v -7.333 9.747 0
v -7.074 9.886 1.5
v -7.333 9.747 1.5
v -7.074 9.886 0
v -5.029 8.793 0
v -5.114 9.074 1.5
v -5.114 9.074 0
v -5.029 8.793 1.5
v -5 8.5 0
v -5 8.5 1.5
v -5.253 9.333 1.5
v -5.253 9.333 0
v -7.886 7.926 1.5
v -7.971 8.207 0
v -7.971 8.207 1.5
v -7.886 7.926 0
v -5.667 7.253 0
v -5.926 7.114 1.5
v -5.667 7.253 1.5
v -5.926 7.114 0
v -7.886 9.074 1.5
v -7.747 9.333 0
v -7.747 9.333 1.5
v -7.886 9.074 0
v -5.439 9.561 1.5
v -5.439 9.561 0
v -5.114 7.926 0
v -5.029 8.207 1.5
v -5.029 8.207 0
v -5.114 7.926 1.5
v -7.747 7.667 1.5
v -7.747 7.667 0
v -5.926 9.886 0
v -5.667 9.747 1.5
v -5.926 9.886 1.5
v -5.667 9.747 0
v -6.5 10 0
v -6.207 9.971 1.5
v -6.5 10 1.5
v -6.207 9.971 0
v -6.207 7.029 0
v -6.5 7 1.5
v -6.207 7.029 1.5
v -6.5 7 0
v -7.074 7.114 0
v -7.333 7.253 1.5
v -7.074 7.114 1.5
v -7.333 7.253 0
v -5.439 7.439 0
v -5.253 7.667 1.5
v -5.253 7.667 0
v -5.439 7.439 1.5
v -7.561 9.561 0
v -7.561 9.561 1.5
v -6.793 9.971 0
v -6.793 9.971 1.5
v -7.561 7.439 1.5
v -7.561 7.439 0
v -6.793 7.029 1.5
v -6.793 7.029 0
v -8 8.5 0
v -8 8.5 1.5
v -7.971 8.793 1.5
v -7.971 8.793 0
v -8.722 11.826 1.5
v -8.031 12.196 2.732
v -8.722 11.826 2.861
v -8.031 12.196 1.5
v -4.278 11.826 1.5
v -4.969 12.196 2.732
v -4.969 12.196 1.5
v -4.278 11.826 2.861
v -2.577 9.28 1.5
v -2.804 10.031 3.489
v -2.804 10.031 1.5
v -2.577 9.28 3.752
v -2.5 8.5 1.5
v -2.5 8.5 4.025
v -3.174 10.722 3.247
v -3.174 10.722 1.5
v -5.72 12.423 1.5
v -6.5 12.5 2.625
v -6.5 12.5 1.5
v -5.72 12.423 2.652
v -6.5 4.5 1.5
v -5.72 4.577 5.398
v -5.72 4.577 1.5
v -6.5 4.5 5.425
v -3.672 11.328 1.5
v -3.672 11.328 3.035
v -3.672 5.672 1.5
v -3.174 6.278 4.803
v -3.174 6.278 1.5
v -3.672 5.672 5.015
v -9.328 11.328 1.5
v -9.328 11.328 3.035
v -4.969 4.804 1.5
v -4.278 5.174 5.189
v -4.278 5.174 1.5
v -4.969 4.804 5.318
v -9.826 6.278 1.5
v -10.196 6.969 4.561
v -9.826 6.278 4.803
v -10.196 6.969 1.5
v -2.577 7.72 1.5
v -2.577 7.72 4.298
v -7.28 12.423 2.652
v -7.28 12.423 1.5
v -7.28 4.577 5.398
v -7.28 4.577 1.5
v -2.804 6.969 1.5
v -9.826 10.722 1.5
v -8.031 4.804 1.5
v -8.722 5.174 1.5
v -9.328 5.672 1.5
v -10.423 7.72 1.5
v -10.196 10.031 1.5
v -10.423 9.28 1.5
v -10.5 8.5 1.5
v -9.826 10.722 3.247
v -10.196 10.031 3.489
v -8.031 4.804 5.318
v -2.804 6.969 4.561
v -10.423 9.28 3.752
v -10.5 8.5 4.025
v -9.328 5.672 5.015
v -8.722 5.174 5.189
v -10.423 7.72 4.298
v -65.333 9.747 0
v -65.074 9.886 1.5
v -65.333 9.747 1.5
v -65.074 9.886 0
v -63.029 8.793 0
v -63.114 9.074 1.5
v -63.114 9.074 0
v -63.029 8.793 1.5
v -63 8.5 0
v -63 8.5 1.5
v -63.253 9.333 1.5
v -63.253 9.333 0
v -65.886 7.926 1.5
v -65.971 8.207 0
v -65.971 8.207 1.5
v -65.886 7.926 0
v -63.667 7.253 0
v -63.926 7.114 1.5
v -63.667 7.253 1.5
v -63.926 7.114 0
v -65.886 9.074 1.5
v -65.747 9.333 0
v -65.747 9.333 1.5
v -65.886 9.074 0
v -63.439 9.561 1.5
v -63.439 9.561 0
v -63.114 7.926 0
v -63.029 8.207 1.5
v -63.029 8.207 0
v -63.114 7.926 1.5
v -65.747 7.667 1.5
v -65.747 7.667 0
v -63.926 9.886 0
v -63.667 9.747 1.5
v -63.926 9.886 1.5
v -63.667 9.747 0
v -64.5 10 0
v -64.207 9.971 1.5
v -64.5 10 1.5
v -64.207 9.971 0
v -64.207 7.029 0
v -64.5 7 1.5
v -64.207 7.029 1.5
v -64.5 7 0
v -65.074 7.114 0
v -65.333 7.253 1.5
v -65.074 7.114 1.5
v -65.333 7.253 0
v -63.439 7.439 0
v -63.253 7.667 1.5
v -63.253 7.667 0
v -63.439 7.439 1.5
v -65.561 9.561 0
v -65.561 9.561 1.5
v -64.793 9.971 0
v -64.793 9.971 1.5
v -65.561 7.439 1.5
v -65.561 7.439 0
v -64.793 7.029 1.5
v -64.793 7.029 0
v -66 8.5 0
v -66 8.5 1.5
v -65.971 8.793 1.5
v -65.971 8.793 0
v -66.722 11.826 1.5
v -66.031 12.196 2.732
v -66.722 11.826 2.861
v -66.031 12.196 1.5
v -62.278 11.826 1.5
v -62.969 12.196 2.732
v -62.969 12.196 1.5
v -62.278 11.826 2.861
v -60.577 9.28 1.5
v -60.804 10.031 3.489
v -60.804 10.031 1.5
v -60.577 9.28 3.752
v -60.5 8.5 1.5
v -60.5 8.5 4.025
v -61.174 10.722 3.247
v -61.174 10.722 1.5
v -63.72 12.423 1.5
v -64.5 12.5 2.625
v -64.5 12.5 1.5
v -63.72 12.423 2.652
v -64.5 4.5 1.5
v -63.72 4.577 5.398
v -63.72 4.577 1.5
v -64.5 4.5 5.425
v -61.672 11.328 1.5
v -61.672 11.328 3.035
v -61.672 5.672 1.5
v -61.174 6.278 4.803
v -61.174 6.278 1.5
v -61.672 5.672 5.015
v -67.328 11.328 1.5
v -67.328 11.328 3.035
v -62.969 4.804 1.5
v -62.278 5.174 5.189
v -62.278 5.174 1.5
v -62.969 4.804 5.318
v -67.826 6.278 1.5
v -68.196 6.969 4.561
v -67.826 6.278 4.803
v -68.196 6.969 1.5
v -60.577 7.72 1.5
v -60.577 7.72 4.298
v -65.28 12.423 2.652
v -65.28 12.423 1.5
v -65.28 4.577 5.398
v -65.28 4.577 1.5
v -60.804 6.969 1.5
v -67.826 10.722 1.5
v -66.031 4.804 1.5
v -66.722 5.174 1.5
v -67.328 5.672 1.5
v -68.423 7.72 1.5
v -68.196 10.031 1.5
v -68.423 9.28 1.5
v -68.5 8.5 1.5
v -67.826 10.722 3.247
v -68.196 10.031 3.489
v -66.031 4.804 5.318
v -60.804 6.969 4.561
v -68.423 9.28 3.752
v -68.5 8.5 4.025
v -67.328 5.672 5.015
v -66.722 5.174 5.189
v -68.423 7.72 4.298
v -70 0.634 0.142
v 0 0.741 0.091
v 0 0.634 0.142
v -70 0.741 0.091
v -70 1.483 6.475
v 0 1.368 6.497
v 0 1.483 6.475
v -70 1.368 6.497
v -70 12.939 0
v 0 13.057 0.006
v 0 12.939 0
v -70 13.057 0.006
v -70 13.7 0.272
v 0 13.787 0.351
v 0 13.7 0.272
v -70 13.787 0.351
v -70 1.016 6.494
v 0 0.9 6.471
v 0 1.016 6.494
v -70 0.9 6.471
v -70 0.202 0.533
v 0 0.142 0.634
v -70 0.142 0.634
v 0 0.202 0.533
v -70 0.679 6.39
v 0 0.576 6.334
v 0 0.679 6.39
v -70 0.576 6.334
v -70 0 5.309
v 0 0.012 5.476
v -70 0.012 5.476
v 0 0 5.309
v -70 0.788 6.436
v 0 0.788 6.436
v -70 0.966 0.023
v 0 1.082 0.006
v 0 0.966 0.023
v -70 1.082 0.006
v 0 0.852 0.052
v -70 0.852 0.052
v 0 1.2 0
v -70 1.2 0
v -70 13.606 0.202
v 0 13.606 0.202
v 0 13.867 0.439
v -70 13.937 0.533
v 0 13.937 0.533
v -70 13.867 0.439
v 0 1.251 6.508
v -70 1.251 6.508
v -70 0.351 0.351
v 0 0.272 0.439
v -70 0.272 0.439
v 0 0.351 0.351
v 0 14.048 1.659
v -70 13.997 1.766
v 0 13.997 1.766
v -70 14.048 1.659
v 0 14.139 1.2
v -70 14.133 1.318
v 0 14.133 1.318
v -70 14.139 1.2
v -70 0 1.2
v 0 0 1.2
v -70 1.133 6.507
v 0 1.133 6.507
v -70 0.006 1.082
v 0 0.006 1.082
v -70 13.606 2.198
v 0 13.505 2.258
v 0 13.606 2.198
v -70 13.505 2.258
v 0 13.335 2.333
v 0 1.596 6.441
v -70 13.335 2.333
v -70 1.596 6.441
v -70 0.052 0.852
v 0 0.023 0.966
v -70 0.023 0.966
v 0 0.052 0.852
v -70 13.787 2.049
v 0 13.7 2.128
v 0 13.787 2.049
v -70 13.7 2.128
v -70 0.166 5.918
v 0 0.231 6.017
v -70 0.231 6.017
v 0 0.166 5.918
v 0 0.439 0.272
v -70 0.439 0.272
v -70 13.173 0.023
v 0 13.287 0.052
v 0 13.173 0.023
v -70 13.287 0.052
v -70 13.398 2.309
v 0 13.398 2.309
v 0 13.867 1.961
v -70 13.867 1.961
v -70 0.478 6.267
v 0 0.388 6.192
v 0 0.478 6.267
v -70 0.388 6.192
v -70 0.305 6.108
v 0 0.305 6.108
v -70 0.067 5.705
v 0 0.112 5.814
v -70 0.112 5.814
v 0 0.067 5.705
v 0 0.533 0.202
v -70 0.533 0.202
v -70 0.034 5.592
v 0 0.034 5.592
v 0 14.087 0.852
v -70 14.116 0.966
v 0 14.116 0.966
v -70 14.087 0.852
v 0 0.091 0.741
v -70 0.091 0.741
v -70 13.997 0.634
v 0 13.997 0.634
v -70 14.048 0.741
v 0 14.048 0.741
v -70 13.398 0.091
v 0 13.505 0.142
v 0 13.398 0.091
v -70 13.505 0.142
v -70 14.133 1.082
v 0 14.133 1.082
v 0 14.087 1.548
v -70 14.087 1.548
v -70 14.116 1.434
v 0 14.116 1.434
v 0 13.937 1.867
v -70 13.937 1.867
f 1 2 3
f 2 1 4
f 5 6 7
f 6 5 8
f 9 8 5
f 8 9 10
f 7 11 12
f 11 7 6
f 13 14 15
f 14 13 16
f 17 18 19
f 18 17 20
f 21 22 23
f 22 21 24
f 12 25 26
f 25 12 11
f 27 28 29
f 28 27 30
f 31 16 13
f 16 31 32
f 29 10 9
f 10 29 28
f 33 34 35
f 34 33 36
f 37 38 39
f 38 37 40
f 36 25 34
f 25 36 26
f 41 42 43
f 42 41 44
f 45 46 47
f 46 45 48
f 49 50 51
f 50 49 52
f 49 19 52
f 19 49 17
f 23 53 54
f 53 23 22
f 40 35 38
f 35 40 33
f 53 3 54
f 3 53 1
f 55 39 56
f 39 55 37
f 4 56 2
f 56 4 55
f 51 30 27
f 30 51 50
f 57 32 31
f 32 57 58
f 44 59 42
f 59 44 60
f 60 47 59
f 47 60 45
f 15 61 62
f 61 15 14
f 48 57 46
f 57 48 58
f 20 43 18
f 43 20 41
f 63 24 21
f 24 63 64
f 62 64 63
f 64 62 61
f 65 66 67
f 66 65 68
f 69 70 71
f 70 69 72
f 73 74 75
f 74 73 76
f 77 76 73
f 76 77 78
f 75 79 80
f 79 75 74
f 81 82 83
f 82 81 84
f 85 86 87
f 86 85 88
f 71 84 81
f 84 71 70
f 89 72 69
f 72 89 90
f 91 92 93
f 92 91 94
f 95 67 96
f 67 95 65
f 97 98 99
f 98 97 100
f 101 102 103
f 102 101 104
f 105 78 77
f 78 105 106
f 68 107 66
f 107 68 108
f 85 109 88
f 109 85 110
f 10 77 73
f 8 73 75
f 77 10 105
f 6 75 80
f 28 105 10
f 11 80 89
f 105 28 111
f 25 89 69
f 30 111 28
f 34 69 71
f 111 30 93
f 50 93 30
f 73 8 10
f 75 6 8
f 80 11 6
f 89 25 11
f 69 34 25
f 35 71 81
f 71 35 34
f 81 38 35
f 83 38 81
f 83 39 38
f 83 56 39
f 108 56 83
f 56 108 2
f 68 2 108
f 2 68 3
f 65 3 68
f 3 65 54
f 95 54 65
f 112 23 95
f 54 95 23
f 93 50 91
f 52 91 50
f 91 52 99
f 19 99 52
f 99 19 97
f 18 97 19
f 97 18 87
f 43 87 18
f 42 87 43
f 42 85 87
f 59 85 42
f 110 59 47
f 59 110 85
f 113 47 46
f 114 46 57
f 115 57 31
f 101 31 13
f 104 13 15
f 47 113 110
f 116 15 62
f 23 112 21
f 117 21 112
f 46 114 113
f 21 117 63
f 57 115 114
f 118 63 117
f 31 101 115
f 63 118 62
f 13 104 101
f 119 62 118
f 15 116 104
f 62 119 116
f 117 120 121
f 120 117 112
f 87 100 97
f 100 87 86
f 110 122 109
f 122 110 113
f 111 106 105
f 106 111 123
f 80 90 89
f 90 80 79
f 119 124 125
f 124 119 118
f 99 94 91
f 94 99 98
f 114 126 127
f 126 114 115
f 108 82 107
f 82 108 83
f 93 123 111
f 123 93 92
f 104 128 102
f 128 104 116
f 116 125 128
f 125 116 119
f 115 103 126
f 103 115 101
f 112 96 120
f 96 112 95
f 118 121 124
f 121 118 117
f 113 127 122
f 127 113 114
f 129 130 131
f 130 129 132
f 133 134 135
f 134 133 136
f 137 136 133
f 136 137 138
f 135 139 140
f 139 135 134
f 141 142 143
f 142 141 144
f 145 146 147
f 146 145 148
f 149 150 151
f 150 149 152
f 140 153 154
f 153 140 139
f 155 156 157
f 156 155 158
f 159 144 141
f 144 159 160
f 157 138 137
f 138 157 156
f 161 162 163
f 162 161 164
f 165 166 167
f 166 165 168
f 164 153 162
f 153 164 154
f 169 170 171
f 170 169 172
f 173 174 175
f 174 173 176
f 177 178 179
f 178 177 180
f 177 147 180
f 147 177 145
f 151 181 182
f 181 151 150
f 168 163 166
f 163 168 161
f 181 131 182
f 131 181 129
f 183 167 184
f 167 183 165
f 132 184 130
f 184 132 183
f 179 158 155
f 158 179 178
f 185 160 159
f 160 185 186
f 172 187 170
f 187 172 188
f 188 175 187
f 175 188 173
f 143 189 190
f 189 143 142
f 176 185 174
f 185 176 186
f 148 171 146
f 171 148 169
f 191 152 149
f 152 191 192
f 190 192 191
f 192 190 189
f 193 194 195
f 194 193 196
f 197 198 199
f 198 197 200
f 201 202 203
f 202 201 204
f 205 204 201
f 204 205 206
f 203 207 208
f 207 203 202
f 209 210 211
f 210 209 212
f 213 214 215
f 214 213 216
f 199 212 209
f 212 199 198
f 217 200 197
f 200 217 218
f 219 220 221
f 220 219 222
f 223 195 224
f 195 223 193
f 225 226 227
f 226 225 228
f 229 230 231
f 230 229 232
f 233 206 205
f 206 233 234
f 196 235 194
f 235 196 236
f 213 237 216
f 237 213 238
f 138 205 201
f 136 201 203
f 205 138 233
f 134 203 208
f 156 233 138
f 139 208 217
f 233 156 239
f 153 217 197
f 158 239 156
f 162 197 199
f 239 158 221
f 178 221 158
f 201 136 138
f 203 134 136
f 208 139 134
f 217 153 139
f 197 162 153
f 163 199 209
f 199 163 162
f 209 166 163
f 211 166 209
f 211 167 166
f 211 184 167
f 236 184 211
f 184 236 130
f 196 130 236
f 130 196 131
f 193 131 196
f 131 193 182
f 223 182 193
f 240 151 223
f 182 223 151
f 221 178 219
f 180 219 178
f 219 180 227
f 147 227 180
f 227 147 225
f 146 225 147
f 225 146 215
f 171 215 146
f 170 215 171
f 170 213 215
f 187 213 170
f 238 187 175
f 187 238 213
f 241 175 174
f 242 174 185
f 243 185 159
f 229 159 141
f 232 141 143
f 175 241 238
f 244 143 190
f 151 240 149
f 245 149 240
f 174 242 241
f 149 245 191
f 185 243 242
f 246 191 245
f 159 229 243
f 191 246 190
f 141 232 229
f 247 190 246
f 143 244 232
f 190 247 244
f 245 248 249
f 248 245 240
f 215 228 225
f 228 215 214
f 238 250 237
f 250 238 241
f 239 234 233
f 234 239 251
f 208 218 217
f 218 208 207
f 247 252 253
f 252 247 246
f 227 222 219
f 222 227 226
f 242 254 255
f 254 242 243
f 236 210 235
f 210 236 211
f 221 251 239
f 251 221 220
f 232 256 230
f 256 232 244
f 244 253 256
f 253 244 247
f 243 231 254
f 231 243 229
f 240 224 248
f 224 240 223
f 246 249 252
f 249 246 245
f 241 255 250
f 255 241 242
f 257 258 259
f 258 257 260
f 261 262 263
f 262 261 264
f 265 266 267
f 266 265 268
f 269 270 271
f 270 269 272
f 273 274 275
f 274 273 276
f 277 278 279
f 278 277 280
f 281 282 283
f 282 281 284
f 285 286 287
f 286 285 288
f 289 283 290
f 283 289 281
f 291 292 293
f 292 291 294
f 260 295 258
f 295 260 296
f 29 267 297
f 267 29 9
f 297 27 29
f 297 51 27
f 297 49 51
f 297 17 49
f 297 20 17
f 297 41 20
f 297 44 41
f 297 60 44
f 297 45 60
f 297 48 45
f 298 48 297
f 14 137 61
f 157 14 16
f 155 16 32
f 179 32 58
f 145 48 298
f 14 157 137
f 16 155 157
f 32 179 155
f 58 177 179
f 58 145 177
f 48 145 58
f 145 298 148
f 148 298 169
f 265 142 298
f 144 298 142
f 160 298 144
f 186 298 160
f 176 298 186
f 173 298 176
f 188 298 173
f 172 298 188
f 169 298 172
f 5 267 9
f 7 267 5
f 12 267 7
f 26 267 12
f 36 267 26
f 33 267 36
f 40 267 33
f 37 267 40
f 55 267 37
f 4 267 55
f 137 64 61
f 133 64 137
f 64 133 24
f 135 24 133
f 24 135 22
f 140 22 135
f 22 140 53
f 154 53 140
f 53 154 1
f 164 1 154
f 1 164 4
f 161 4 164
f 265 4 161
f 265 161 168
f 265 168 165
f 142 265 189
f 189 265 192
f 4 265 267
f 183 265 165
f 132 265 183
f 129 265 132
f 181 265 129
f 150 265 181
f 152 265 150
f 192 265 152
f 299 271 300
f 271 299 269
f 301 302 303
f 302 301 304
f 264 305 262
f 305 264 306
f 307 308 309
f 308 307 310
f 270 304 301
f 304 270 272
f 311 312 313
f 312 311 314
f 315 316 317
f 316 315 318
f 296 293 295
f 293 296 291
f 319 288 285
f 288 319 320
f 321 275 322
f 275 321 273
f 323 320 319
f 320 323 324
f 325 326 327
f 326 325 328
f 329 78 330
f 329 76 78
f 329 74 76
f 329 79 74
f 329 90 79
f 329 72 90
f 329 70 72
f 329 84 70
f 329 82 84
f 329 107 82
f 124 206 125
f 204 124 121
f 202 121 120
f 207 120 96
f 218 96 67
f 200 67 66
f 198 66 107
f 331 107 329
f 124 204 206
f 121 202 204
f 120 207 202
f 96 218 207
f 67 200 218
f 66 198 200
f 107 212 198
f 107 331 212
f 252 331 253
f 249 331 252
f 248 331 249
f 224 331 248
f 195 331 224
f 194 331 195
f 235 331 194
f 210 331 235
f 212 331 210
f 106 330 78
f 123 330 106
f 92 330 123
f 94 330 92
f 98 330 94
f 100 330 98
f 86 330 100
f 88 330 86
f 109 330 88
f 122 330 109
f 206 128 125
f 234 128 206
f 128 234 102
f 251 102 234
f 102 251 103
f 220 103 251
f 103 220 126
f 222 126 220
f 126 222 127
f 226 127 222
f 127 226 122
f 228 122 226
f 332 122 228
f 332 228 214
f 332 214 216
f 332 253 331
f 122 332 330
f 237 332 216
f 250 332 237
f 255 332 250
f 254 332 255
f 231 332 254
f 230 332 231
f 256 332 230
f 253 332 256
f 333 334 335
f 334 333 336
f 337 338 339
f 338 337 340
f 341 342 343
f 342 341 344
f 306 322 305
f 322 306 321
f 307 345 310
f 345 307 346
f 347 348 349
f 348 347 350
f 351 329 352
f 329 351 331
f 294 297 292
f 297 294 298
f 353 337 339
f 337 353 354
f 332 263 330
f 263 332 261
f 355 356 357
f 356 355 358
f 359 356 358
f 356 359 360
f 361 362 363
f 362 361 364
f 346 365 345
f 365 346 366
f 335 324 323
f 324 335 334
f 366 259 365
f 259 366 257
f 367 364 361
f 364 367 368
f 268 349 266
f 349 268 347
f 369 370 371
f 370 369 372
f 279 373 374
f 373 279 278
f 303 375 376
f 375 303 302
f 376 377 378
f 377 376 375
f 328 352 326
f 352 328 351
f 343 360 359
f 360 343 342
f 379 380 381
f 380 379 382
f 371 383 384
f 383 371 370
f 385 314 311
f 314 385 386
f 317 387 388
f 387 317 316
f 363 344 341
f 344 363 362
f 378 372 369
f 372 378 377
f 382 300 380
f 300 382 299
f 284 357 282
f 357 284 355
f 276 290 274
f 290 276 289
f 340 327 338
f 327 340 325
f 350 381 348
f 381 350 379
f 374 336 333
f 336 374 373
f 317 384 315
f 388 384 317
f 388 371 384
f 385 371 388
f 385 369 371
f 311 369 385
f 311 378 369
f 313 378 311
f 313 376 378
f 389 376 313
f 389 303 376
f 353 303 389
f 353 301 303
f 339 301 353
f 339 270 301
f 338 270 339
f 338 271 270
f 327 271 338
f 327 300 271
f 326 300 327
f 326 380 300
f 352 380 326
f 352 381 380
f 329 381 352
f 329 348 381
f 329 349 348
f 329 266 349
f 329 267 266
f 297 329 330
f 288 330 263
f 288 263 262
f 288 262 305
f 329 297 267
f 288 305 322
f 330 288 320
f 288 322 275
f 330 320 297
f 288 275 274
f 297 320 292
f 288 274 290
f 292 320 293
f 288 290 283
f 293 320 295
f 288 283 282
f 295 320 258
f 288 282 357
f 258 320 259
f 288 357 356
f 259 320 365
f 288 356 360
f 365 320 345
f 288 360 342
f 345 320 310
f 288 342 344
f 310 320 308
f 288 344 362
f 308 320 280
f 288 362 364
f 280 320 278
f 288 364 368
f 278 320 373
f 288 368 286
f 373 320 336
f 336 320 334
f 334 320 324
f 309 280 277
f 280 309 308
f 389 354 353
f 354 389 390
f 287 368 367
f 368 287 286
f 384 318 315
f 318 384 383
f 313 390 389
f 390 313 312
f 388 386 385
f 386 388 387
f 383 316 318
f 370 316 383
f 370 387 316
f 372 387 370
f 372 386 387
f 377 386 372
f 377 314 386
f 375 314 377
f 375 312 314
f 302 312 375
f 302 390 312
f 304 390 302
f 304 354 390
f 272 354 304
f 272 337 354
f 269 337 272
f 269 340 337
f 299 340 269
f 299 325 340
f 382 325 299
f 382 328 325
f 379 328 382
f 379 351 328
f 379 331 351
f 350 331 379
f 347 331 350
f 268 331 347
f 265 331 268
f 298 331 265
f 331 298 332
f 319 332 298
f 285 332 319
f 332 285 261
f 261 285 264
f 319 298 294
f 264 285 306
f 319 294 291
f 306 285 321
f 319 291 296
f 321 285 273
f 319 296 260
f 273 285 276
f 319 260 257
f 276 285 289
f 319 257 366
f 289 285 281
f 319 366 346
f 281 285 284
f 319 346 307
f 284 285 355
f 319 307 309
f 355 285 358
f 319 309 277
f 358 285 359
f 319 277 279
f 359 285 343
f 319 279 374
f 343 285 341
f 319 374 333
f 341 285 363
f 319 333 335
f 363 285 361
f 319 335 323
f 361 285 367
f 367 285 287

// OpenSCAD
// file: parts/screw_cutout.scad
/*
 * Nomad Core - Screw Cutout Module
 * M2.5 screw hole with hex nut recess access from bottom
 * 
 * Screw specs: M2.5 threading, 16mm long, TR8 hex head
 */

// ============================================
// SCREW CUTOUT CONFIGURATION
// ============================================
// All screw cutout settings:
// - Shaft diameter and height
// - Nut recess dimensions and positioning

// ============================================
// SCREW SPECIFICATIONS
// ============================================
screw_shaft_diameter = 3.0;   // Clearance for M2.5 screw (mm)
screw_shaft_height = 25.0;    // Full height to pass through (mm)
nut_recess_diameter = 8.0;    // Hex nut pocket diameter (mm)
nut_recess_height = 6.0;      // Hex nut pocket depth (mm)
nut_recess_offset = 4.5;      // Start position from bottom (mm)

// ============================================
// RENDER QUALITY
// ============================================
$fn = 32;

// ============================================
// SCREW CUTOUT MODULE
// ============================================
// Creates M2.5 screw hole with hex nut recess accessible from bottom
//
// Parameters: None (uses global specifications above)
//
// Usage: difference() { your_part(); translate([x,y,z]) screw_cutout(); }

module screw_cutout() {
    union() {
        // Screw shaft hole - full height to allow screw to pass through
        cylinder(h=screw_shaft_height, d=screw_shaft_diameter, center=false);
        
        // Hex nut recess - starts offset from bottom to create nut pocket
        translate([0, 0, nut_recess_offset])
            cylinder(h=nut_recess_height, d=nut_recess_diameter, center=false);
    }
}

// ============================================
// TEST RENDER (uncomment for visualization)
// ============================================
// screw_cutout();
//
// // Show reference cube to see the cutout in context
// %translate([0, 0, 5])
//     cube([15, 15, 5], center=true);
// main file
/*
 * Nomad Core - Brain Mount Bracket
 * Mounting bracket for compute module (Raspberry Pi or compatible)
 * 
 * Single wedge-shaped bracket with M2.5 screw holes for secure mounting
 * Designed to attach to left side of main baseplate
 */

// ============================================
// IMPORTS
// ============================================
use <parts/screw_cutout.scad>

// ============================================
// BRAIN MOUNT CONFIGURATION
// ============================================
// All brain mount settings consolidated here for easy adjustment:
// - Wedge dimensions
// - Screw hole positions (matching Pi 3B+ pattern)
// - Component positioning

// ============================================
// WEDGE 1 DIMENSIONS (Long wedge with screw holes)
// ============================================
wedge1_size = [20.0, 70.0, 7.0];  // [Width, Length, Height] (mm)
nose_round_radius = 1.2;          // Radius to soften wedge nose/corners (mm)

// ============================================
// SCREW HOLE POSITIONS
// ============================================
// Hole positions on Wedge 1 match Pi 3B+ mounting pattern
hole1_offset = [6.5, 8.5];   // [Long edge, Short edge] distance (mm)
pi_length_spacing = 58.0;    // Standard Pi mounting spacing (mm)
hole2_offset = [hole1_offset[0] + pi_length_spacing, hole1_offset[1]];  // [64.5, 8.5] (mm)
screw_depth = -3.0;          // Inset from wedge surface (mm)

// ============================================
// RENDER QUALITY
// ============================================
$fn = 64;

// ============================================
// RIGHT ANGLE WEDGE MODULE
// ============================================
// Creates a right-angle triangular prism
//
// Parameters:
// - width: Triangle-to-triangle dimension (mm)
// - length: Back wall to nose dimension (mm)
// - height: Tall dimension (mm)

module wedge(width, length, height) {
    // Rotate to proper orientation for mounting
    rotate([0, 0, 90])
    rotate([90, 0, 0])
    translate([0, 0, -length])
    linear_extrude(height=length)
        offset(r=nose_round_radius)
        offset(delta=-nose_round_radius)
            polygon([
                [0, 0],        // Origin
                [width, 0],    // Right edge
                [0, height]    // Top corner
            ]);
}

// ============================================
// WEDGE 1 WITH SCREW HOLES
// ============================================
// Long wedge with two M2.5 screw holes matching Pi mounting pattern

module wedge1_with_holes() {
    difference() {
        // Main wedge body
        wedge(wedge1_size[0], wedge1_size[1], wedge1_size[2]);
        
        // First screw hole
        translate([-hole1_offset[0], hole1_offset[1], screw_depth])
            screw_cutout();
        
        // Second screw hole (Pi lengthwise spacing)
        translate([-hole2_offset[0], hole2_offset[1], screw_depth])
            screw_cutout();
    }
}

// ============================================
// COMPLETE BRAIN MOUNT ASSEMBLY
// ============================================
module brain_mount() {
    union() {
        // Wedge 1 (long wedge with screw holes)
        wedge1_with_holes();
    }
}

// ============================================
// MAIN RENDER
// ============================================
brain_mount();
